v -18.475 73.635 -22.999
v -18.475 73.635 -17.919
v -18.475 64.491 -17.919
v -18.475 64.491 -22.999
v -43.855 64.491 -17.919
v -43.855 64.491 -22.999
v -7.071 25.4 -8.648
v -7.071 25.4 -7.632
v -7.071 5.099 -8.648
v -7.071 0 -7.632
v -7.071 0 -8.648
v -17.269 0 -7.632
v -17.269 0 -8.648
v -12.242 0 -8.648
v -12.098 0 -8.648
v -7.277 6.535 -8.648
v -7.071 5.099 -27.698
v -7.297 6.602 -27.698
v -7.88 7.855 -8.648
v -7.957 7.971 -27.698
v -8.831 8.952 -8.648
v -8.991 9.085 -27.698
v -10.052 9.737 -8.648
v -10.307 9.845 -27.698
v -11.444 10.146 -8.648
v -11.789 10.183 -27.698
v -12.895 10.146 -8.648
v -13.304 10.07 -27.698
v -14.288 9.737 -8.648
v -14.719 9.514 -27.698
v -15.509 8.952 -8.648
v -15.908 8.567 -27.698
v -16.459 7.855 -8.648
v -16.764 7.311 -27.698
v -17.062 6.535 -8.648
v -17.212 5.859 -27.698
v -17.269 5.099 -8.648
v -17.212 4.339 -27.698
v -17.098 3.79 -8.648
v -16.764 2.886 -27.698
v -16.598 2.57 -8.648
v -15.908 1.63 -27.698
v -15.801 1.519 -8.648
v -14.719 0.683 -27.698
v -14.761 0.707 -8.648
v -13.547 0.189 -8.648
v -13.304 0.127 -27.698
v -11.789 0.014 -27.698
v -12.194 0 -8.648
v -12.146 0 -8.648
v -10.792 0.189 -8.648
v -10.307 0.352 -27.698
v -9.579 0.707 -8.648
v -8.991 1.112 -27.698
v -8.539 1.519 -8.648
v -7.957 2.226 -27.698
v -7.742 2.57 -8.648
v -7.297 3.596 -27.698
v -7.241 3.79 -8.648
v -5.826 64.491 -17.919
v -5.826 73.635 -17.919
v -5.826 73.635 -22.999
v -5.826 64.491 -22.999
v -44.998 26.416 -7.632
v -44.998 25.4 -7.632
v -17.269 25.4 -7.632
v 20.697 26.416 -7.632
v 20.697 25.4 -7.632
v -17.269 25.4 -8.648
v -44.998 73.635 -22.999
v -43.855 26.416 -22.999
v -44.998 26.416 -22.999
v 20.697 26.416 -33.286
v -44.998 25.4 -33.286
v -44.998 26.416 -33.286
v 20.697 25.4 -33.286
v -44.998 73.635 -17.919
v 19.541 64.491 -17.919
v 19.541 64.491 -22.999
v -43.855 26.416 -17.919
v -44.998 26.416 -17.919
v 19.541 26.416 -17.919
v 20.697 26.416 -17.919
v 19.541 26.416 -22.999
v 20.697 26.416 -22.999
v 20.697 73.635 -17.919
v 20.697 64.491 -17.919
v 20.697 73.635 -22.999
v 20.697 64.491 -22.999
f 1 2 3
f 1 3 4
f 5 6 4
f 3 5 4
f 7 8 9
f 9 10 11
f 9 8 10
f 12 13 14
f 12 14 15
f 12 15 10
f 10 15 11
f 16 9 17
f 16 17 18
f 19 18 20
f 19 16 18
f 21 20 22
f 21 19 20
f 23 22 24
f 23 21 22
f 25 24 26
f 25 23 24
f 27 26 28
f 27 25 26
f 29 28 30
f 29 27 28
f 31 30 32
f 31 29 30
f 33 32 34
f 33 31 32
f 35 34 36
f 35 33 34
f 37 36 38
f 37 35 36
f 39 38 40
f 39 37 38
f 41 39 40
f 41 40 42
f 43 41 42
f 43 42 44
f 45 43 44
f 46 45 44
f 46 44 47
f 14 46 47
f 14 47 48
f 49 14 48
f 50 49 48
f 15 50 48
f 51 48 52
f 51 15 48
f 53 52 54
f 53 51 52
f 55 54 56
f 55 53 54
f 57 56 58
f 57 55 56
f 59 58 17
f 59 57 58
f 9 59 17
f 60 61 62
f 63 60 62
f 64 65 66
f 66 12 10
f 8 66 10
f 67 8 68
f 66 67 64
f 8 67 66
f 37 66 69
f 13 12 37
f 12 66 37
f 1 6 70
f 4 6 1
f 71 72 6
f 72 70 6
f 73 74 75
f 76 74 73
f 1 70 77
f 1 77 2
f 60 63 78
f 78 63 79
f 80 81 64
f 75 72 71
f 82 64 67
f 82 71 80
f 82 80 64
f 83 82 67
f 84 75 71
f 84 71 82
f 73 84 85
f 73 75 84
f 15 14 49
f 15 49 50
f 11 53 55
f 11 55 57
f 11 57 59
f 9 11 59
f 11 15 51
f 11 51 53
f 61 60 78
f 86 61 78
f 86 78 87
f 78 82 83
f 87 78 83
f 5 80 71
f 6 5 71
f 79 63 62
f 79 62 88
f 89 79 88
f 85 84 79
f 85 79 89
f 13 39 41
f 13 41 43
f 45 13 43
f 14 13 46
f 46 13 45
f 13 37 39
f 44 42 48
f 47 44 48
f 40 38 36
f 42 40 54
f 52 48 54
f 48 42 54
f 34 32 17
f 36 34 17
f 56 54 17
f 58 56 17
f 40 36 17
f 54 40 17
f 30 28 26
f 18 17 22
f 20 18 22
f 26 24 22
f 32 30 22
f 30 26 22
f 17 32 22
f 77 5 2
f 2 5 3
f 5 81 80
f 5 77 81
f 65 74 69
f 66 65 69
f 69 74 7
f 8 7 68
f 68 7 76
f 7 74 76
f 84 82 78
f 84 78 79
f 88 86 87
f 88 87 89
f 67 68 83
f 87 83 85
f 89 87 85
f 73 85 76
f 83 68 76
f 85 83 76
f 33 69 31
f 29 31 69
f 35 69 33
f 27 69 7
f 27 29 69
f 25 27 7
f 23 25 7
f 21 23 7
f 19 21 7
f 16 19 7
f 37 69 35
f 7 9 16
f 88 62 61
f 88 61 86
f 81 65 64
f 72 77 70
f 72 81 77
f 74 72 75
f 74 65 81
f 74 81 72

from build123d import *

# Parameters (mm, degrees)
SKETCH6_W            = 10.1981
SKETCH6_H            = 1.016
BOSS_EXTRUDE3_DEPTH  = 25.4
SKETCH8_R            = 5.09905
BOSS_EXTRUDE5_DEPTH  = 19.05
SKETCH11_W           = 65.69456
SKETCH11_H           = 25.654
BOSS_EXTRUDE10_DEPTH = 1.016
SKETCH16_W           = 1.143
SKETCH16_H           = 5.08
SKETCH16_W_2         = 1.155076163
BOSS_EXTRUDE11_DEPTH = 38.0746
SKETCH17_W           = 26.52268
SKETCH17_H           = 5.08
BOSS_EXTRUDE12_DEPTH = 9.144


with BuildPart() as part:
    # Sketch6 → Boss-Extrude3 (new body)
    with BuildSketch(Plane(origin=(0, 0, 0), x_dir=(1, 0, 0), z_dir=(0, 1, 0))):
        with Locations((-12.169797761, 8.14004804)):
            Rectangle(SKETCH6_W, SKETCH6_H)
    extrude(amount=BOSS_EXTRUDE3_DEPTH)

    # Sketch8 → Boss-Extrude5 (add)
    with BuildSketch(Plane.XY.offset(-8.64804804)):
        with Locations((-12.169797761, 5.098542)):
            Circle(SKETCH8_R)
    extrude(amount=-BOSS_EXTRUDE5_DEPTH)

    # Sketch11 → Boss-Extrude10 (add)
    with BuildSketch(Plane(origin=(0, 25.4, 0), x_dir=(1, 0, 0), z_dir=(0, 1, 0))):
        with Locations((-12.150747761, 20.45904804)):
            Rectangle(SKETCH11_W, SKETCH11_H)
    extrude(amount=BOSS_EXTRUDE10_DEPTH)

    # Sketch16 → Boss-Extrude11 (add)
    with BuildSketch(Plane(origin=(0, 26.416, 0), x_dir=(1, 0, 0), z_dir=(0, 1, 0))):
        with Locations((-44.426527761, 20.45904804)):
            Rectangle(SKETCH16_W, SKETCH16_H)
        with Locations((20.118994158, 20.45904804)):
            Rectangle(SKETCH16_W_2, SKETCH16_H)
    extrude(amount=BOSS_EXTRUDE11_DEPTH)

    # Sketch17 → Boss-Extrude12 (add)
    with BuildSketch(Plane(origin=(0, 64.4906, 0), x_dir=(1, 0, 0), z_dir=(0, 1, 0))):
        with Locations((-31.736687761, 20.45904804)):
            Rectangle(SKETCH17_W, SKETCH17_H)
        with Locations((7.435192239, 20.45904804)):
            Rectangle(SKETCH17_W, SKETCH17_H)
    extrude(amount=BOSS_EXTRUDE12_DEPTH)


solid = part.part
